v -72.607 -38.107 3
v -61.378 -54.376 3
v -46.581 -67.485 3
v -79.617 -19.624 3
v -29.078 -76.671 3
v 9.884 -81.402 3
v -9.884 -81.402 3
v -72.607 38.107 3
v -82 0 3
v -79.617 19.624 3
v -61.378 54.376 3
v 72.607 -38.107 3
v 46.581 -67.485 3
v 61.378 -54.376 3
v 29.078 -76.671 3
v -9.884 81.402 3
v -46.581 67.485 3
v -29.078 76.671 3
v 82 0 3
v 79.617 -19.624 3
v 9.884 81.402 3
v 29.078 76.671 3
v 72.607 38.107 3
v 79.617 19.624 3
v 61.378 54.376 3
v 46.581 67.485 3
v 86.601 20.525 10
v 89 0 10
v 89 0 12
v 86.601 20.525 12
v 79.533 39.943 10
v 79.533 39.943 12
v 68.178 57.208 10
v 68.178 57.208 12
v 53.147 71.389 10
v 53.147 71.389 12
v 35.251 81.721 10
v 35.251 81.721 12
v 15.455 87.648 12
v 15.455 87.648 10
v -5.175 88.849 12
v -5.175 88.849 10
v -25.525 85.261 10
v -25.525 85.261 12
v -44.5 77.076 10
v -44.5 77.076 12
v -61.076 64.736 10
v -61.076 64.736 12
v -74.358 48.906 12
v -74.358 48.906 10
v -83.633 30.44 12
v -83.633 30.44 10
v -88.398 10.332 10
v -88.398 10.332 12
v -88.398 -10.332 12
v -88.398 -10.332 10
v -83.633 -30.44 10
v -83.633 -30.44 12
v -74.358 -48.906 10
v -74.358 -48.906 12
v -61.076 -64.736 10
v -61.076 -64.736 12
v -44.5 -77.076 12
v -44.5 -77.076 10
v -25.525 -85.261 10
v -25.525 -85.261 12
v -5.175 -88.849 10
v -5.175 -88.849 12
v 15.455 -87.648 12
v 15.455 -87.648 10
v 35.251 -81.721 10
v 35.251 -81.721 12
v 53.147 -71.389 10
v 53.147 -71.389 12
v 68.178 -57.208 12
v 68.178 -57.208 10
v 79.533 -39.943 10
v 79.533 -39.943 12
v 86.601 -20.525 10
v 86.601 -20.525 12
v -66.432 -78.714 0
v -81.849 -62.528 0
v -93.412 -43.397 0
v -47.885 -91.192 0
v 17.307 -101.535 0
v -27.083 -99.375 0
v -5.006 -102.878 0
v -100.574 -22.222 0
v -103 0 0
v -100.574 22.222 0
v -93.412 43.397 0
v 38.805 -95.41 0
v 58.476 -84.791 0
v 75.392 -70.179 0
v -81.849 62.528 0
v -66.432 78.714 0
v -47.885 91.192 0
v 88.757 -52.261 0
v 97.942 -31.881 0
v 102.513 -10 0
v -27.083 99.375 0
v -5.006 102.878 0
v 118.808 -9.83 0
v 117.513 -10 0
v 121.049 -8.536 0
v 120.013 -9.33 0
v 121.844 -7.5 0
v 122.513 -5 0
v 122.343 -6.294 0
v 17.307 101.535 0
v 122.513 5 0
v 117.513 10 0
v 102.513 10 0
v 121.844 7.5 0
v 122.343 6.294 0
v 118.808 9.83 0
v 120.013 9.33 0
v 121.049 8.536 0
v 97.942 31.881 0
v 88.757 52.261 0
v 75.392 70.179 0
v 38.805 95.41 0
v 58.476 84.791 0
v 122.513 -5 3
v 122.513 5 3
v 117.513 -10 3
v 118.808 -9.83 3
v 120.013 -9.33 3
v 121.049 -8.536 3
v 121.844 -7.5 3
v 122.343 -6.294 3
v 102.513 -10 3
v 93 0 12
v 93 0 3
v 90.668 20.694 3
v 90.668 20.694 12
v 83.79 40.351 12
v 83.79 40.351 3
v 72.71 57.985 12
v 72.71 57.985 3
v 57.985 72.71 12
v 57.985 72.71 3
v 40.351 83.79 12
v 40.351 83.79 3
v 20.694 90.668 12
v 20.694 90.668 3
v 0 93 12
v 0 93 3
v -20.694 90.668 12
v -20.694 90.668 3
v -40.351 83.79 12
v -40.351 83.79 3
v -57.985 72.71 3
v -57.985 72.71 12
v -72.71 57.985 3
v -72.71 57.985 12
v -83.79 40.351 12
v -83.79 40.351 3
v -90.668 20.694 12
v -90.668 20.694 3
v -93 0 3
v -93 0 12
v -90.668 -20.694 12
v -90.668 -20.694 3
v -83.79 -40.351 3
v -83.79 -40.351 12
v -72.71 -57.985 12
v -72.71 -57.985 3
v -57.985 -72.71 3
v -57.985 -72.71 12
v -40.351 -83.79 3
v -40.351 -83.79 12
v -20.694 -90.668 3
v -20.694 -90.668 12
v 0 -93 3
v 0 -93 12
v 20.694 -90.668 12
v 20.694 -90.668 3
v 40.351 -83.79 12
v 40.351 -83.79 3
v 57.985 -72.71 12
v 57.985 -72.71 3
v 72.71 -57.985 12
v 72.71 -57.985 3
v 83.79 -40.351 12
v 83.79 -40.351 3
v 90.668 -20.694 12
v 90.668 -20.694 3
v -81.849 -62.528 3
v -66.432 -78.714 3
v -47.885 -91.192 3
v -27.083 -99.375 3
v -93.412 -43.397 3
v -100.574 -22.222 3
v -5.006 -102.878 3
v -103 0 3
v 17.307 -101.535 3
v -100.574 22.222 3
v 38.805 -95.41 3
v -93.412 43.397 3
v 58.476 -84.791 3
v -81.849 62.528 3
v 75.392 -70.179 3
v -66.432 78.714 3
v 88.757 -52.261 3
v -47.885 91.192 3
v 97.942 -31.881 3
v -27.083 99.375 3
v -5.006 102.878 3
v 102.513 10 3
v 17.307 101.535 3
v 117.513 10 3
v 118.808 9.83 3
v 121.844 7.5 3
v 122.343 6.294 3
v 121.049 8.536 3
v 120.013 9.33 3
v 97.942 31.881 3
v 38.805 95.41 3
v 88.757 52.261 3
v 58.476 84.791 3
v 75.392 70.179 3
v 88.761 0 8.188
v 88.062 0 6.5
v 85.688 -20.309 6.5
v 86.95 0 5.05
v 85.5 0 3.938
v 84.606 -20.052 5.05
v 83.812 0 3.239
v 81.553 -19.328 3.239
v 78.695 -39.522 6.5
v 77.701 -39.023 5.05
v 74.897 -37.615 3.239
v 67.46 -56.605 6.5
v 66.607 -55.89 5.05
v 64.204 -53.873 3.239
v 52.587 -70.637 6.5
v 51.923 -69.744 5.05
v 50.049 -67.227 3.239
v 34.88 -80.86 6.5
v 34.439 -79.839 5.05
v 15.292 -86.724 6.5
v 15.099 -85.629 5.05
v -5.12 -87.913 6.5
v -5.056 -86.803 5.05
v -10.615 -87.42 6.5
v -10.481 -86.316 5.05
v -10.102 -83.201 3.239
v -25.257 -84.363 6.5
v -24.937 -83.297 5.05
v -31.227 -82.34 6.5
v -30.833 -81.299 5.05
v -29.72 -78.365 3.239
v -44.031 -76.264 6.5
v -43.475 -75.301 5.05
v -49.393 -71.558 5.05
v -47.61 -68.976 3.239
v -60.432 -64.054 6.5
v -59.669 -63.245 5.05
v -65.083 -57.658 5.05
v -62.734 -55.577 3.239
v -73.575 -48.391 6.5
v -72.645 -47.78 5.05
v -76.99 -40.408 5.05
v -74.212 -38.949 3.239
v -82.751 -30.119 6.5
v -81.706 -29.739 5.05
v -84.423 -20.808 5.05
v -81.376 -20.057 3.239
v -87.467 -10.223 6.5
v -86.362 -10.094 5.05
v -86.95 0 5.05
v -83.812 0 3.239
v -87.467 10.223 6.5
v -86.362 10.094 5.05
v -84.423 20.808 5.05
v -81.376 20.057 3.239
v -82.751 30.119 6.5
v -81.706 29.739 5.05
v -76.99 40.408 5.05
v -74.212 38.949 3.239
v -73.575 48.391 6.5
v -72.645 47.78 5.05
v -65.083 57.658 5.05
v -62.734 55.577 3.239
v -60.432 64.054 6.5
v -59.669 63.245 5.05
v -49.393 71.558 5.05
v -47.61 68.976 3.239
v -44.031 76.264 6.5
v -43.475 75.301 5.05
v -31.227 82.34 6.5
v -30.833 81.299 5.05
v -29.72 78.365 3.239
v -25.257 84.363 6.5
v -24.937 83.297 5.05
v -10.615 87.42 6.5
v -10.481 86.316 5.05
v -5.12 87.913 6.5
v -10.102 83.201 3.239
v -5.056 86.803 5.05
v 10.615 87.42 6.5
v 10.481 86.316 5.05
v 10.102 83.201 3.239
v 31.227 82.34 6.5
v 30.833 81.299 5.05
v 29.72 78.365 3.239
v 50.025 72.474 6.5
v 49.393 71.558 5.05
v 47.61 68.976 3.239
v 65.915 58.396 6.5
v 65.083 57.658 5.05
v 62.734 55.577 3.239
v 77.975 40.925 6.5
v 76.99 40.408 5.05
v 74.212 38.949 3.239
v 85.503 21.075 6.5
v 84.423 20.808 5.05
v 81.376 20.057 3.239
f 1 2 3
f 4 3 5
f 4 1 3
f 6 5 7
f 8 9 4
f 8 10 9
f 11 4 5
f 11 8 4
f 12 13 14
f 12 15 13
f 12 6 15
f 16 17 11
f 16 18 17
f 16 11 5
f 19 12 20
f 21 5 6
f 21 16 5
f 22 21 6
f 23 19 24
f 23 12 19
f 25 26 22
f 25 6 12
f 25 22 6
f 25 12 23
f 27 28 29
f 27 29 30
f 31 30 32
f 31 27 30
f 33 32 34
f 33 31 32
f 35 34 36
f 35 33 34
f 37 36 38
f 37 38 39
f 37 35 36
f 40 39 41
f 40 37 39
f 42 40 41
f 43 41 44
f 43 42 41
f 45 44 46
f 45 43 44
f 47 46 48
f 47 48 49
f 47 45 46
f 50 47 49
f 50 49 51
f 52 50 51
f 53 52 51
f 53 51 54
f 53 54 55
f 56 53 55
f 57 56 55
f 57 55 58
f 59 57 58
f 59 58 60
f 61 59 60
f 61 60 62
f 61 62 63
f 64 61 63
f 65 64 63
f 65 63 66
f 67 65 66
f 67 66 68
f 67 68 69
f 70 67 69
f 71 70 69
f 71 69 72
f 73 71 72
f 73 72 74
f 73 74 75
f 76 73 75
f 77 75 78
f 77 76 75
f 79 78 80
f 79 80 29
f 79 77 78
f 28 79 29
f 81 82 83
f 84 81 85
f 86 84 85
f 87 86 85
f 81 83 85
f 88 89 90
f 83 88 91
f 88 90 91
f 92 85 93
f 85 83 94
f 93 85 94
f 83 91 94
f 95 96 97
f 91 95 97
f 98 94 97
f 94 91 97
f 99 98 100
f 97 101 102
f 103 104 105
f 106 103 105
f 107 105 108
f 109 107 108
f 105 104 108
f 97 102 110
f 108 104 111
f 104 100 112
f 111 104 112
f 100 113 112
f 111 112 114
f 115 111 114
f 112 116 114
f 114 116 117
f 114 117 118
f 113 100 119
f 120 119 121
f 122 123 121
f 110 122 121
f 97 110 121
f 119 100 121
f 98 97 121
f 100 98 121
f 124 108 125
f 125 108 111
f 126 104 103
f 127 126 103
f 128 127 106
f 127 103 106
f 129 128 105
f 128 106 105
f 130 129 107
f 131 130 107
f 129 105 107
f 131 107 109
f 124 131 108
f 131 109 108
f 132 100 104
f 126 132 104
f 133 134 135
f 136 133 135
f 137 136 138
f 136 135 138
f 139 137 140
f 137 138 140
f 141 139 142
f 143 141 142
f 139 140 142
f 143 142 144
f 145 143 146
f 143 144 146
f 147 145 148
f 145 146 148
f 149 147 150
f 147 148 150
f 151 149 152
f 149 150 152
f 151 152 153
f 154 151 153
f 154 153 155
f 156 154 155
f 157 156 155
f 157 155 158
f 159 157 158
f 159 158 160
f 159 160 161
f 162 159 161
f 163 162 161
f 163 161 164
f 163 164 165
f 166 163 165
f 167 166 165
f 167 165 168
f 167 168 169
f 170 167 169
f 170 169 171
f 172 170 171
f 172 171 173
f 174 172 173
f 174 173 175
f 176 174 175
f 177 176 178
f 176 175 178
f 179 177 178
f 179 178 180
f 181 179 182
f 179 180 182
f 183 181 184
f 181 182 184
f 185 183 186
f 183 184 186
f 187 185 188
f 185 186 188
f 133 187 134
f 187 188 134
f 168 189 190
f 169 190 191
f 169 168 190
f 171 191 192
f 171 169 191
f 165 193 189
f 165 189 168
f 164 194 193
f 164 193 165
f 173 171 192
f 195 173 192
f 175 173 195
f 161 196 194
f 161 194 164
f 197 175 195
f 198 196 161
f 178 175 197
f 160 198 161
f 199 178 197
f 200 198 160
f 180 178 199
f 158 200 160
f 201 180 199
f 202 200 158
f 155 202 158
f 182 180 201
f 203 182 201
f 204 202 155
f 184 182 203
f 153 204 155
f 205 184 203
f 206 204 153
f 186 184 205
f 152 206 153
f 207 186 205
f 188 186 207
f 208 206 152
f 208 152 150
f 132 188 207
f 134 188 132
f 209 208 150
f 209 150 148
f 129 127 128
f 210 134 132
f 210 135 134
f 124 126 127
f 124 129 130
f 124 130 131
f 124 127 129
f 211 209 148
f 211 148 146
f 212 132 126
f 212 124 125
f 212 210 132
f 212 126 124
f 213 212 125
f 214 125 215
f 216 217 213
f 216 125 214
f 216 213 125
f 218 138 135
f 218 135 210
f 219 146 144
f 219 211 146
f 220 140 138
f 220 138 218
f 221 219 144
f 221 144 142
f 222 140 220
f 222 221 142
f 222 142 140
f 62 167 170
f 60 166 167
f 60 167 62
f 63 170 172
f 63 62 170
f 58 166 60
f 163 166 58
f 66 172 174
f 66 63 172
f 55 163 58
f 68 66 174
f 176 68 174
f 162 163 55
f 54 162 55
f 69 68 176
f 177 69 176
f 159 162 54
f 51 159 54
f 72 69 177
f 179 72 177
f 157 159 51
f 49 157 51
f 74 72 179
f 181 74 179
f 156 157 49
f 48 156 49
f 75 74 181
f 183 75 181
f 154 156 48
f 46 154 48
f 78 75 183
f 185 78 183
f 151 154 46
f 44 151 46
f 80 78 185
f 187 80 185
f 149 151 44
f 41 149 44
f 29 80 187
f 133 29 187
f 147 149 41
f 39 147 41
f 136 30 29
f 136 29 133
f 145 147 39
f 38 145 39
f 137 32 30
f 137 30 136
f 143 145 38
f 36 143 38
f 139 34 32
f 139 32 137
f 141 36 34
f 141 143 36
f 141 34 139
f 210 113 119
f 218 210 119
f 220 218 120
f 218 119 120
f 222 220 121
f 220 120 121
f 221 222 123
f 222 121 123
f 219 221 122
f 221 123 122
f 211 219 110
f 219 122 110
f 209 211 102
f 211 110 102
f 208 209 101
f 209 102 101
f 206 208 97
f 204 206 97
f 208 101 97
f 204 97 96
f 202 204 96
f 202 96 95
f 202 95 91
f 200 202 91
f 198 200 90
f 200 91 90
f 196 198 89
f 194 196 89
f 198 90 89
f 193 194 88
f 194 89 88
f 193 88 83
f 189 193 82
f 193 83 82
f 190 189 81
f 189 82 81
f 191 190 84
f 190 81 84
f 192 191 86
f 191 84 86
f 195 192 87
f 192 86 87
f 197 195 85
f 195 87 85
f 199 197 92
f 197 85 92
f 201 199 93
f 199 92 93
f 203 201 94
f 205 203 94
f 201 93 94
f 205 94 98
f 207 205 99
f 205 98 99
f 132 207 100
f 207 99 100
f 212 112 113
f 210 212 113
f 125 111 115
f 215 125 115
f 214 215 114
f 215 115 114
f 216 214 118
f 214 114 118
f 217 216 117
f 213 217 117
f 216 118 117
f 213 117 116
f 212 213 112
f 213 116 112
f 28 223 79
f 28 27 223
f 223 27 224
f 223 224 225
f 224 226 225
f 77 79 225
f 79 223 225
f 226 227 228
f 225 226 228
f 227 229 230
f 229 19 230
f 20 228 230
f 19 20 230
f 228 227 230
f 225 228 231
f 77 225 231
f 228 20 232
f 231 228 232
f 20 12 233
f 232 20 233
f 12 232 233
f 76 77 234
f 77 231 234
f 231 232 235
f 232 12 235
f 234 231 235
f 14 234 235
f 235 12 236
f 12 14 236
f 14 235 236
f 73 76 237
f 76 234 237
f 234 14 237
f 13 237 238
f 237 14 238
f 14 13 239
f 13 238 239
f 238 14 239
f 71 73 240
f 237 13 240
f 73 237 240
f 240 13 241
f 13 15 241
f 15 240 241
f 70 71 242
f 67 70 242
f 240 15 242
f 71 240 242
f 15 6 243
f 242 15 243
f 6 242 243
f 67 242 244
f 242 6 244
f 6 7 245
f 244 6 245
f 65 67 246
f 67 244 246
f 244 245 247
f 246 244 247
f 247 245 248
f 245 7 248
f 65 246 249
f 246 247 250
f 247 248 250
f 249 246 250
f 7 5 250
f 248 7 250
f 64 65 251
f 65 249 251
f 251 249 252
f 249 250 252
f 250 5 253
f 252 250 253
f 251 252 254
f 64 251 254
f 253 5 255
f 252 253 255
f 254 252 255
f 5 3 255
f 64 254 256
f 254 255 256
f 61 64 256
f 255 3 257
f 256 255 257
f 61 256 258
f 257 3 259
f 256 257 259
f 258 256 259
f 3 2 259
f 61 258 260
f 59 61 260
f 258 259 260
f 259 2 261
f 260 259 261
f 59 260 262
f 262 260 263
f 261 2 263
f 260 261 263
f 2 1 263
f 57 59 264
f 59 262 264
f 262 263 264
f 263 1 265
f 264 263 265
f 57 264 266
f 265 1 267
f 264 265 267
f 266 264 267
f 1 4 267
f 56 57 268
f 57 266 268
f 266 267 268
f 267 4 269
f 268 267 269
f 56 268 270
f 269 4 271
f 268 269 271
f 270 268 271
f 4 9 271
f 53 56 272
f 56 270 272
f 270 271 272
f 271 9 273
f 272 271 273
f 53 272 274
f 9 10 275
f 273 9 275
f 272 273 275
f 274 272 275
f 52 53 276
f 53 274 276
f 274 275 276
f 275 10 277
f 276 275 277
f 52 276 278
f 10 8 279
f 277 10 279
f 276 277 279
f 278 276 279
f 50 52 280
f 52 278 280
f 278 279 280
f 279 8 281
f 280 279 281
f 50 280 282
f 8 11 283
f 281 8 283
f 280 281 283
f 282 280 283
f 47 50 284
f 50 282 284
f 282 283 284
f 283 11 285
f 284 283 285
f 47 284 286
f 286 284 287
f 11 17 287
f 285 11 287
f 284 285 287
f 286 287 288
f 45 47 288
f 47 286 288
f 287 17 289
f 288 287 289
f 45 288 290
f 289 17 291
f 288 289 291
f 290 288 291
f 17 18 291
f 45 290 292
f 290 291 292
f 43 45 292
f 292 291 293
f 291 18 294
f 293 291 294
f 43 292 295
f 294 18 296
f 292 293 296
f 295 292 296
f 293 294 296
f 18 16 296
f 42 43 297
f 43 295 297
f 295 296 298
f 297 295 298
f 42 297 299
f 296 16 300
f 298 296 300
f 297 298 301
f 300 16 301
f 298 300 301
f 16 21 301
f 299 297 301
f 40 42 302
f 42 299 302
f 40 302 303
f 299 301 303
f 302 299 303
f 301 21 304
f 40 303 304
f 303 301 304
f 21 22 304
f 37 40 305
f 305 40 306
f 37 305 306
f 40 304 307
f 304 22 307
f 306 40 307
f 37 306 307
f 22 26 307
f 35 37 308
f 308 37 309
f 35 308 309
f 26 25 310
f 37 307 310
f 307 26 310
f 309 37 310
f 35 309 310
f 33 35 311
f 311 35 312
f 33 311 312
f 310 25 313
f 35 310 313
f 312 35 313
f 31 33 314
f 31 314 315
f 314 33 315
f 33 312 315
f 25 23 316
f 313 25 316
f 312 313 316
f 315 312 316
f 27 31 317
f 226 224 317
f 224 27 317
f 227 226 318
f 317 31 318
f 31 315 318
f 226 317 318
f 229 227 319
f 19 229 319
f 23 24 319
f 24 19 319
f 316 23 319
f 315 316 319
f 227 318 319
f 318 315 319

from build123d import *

# Parameters (mm, degrees)
F0_R     = 93
F0_R_2   = 89
F1_DEPTH = 3
F2_DEPTH = 12
F3_R     = 7


with BuildPart() as f1:
    # F0 (on Top) → F1 (new body)
    with BuildSketch(Plane.XY):
        with BuildLine():
            ThreePointArc((102.5134137564, -10), (102.8782815197, -5.0059156548), (103, 0))
            ThreePointArc((103, 0), (102.8782815197, 5.0059156548), (102.5134137564, 10))
            ThreePointArc((102.5134137564, 10), (-103, 0), (102.5134137564, -10))
        make_face()
        Circle(F0_R, mode=Mode.SUBTRACT)
        Circle(F0_R)
        Circle(F0_R_2, mode=Mode.SUBTRACT)
        Circle(F0_R_2)
        with BuildLine():
            ThreePointArc((102.5134137564, 10), (102.8782815197, 5.0059156548), (103, 0))
            ThreePointArc((103, 0), (102.8782815197, -5.0059156548), (102.5134137564, -10))
            Line((102.5134137564, -10), (117.5134137564, -10))
            ThreePointArc((117.5134137564, -10), (121.0489476624, -8.5355339059), (122.5134137564, -5))
            Line((122.5134137564, -5), (122.5134137564, 0))
            Line((122.5134137564, 0), (122.5134137564, 5))
            ThreePointArc((122.5134137564, 5), (121.0489476624, 8.5355339059), (117.5134137564, 10))
            Line((117.5134137564, 10), (102.5134137564, 10))
        make_face()
    extrude(amount=F1_DEPTH)

    # F0 (on Top) → F2 (join)
    with BuildSketch(Plane.XY):
        Circle(F0_R)
        Circle(F0_R_2, mode=Mode.SUBTRACT)
    extrude(amount=F2_DEPTH)

    # F3
    f3_edges = [f1.edges().sort_by_distance(p)[0] for p in [
        (-89, 0, 3),
    ]]
    fillet(f3_edges, radius=F3_R)


solid = f1.part
